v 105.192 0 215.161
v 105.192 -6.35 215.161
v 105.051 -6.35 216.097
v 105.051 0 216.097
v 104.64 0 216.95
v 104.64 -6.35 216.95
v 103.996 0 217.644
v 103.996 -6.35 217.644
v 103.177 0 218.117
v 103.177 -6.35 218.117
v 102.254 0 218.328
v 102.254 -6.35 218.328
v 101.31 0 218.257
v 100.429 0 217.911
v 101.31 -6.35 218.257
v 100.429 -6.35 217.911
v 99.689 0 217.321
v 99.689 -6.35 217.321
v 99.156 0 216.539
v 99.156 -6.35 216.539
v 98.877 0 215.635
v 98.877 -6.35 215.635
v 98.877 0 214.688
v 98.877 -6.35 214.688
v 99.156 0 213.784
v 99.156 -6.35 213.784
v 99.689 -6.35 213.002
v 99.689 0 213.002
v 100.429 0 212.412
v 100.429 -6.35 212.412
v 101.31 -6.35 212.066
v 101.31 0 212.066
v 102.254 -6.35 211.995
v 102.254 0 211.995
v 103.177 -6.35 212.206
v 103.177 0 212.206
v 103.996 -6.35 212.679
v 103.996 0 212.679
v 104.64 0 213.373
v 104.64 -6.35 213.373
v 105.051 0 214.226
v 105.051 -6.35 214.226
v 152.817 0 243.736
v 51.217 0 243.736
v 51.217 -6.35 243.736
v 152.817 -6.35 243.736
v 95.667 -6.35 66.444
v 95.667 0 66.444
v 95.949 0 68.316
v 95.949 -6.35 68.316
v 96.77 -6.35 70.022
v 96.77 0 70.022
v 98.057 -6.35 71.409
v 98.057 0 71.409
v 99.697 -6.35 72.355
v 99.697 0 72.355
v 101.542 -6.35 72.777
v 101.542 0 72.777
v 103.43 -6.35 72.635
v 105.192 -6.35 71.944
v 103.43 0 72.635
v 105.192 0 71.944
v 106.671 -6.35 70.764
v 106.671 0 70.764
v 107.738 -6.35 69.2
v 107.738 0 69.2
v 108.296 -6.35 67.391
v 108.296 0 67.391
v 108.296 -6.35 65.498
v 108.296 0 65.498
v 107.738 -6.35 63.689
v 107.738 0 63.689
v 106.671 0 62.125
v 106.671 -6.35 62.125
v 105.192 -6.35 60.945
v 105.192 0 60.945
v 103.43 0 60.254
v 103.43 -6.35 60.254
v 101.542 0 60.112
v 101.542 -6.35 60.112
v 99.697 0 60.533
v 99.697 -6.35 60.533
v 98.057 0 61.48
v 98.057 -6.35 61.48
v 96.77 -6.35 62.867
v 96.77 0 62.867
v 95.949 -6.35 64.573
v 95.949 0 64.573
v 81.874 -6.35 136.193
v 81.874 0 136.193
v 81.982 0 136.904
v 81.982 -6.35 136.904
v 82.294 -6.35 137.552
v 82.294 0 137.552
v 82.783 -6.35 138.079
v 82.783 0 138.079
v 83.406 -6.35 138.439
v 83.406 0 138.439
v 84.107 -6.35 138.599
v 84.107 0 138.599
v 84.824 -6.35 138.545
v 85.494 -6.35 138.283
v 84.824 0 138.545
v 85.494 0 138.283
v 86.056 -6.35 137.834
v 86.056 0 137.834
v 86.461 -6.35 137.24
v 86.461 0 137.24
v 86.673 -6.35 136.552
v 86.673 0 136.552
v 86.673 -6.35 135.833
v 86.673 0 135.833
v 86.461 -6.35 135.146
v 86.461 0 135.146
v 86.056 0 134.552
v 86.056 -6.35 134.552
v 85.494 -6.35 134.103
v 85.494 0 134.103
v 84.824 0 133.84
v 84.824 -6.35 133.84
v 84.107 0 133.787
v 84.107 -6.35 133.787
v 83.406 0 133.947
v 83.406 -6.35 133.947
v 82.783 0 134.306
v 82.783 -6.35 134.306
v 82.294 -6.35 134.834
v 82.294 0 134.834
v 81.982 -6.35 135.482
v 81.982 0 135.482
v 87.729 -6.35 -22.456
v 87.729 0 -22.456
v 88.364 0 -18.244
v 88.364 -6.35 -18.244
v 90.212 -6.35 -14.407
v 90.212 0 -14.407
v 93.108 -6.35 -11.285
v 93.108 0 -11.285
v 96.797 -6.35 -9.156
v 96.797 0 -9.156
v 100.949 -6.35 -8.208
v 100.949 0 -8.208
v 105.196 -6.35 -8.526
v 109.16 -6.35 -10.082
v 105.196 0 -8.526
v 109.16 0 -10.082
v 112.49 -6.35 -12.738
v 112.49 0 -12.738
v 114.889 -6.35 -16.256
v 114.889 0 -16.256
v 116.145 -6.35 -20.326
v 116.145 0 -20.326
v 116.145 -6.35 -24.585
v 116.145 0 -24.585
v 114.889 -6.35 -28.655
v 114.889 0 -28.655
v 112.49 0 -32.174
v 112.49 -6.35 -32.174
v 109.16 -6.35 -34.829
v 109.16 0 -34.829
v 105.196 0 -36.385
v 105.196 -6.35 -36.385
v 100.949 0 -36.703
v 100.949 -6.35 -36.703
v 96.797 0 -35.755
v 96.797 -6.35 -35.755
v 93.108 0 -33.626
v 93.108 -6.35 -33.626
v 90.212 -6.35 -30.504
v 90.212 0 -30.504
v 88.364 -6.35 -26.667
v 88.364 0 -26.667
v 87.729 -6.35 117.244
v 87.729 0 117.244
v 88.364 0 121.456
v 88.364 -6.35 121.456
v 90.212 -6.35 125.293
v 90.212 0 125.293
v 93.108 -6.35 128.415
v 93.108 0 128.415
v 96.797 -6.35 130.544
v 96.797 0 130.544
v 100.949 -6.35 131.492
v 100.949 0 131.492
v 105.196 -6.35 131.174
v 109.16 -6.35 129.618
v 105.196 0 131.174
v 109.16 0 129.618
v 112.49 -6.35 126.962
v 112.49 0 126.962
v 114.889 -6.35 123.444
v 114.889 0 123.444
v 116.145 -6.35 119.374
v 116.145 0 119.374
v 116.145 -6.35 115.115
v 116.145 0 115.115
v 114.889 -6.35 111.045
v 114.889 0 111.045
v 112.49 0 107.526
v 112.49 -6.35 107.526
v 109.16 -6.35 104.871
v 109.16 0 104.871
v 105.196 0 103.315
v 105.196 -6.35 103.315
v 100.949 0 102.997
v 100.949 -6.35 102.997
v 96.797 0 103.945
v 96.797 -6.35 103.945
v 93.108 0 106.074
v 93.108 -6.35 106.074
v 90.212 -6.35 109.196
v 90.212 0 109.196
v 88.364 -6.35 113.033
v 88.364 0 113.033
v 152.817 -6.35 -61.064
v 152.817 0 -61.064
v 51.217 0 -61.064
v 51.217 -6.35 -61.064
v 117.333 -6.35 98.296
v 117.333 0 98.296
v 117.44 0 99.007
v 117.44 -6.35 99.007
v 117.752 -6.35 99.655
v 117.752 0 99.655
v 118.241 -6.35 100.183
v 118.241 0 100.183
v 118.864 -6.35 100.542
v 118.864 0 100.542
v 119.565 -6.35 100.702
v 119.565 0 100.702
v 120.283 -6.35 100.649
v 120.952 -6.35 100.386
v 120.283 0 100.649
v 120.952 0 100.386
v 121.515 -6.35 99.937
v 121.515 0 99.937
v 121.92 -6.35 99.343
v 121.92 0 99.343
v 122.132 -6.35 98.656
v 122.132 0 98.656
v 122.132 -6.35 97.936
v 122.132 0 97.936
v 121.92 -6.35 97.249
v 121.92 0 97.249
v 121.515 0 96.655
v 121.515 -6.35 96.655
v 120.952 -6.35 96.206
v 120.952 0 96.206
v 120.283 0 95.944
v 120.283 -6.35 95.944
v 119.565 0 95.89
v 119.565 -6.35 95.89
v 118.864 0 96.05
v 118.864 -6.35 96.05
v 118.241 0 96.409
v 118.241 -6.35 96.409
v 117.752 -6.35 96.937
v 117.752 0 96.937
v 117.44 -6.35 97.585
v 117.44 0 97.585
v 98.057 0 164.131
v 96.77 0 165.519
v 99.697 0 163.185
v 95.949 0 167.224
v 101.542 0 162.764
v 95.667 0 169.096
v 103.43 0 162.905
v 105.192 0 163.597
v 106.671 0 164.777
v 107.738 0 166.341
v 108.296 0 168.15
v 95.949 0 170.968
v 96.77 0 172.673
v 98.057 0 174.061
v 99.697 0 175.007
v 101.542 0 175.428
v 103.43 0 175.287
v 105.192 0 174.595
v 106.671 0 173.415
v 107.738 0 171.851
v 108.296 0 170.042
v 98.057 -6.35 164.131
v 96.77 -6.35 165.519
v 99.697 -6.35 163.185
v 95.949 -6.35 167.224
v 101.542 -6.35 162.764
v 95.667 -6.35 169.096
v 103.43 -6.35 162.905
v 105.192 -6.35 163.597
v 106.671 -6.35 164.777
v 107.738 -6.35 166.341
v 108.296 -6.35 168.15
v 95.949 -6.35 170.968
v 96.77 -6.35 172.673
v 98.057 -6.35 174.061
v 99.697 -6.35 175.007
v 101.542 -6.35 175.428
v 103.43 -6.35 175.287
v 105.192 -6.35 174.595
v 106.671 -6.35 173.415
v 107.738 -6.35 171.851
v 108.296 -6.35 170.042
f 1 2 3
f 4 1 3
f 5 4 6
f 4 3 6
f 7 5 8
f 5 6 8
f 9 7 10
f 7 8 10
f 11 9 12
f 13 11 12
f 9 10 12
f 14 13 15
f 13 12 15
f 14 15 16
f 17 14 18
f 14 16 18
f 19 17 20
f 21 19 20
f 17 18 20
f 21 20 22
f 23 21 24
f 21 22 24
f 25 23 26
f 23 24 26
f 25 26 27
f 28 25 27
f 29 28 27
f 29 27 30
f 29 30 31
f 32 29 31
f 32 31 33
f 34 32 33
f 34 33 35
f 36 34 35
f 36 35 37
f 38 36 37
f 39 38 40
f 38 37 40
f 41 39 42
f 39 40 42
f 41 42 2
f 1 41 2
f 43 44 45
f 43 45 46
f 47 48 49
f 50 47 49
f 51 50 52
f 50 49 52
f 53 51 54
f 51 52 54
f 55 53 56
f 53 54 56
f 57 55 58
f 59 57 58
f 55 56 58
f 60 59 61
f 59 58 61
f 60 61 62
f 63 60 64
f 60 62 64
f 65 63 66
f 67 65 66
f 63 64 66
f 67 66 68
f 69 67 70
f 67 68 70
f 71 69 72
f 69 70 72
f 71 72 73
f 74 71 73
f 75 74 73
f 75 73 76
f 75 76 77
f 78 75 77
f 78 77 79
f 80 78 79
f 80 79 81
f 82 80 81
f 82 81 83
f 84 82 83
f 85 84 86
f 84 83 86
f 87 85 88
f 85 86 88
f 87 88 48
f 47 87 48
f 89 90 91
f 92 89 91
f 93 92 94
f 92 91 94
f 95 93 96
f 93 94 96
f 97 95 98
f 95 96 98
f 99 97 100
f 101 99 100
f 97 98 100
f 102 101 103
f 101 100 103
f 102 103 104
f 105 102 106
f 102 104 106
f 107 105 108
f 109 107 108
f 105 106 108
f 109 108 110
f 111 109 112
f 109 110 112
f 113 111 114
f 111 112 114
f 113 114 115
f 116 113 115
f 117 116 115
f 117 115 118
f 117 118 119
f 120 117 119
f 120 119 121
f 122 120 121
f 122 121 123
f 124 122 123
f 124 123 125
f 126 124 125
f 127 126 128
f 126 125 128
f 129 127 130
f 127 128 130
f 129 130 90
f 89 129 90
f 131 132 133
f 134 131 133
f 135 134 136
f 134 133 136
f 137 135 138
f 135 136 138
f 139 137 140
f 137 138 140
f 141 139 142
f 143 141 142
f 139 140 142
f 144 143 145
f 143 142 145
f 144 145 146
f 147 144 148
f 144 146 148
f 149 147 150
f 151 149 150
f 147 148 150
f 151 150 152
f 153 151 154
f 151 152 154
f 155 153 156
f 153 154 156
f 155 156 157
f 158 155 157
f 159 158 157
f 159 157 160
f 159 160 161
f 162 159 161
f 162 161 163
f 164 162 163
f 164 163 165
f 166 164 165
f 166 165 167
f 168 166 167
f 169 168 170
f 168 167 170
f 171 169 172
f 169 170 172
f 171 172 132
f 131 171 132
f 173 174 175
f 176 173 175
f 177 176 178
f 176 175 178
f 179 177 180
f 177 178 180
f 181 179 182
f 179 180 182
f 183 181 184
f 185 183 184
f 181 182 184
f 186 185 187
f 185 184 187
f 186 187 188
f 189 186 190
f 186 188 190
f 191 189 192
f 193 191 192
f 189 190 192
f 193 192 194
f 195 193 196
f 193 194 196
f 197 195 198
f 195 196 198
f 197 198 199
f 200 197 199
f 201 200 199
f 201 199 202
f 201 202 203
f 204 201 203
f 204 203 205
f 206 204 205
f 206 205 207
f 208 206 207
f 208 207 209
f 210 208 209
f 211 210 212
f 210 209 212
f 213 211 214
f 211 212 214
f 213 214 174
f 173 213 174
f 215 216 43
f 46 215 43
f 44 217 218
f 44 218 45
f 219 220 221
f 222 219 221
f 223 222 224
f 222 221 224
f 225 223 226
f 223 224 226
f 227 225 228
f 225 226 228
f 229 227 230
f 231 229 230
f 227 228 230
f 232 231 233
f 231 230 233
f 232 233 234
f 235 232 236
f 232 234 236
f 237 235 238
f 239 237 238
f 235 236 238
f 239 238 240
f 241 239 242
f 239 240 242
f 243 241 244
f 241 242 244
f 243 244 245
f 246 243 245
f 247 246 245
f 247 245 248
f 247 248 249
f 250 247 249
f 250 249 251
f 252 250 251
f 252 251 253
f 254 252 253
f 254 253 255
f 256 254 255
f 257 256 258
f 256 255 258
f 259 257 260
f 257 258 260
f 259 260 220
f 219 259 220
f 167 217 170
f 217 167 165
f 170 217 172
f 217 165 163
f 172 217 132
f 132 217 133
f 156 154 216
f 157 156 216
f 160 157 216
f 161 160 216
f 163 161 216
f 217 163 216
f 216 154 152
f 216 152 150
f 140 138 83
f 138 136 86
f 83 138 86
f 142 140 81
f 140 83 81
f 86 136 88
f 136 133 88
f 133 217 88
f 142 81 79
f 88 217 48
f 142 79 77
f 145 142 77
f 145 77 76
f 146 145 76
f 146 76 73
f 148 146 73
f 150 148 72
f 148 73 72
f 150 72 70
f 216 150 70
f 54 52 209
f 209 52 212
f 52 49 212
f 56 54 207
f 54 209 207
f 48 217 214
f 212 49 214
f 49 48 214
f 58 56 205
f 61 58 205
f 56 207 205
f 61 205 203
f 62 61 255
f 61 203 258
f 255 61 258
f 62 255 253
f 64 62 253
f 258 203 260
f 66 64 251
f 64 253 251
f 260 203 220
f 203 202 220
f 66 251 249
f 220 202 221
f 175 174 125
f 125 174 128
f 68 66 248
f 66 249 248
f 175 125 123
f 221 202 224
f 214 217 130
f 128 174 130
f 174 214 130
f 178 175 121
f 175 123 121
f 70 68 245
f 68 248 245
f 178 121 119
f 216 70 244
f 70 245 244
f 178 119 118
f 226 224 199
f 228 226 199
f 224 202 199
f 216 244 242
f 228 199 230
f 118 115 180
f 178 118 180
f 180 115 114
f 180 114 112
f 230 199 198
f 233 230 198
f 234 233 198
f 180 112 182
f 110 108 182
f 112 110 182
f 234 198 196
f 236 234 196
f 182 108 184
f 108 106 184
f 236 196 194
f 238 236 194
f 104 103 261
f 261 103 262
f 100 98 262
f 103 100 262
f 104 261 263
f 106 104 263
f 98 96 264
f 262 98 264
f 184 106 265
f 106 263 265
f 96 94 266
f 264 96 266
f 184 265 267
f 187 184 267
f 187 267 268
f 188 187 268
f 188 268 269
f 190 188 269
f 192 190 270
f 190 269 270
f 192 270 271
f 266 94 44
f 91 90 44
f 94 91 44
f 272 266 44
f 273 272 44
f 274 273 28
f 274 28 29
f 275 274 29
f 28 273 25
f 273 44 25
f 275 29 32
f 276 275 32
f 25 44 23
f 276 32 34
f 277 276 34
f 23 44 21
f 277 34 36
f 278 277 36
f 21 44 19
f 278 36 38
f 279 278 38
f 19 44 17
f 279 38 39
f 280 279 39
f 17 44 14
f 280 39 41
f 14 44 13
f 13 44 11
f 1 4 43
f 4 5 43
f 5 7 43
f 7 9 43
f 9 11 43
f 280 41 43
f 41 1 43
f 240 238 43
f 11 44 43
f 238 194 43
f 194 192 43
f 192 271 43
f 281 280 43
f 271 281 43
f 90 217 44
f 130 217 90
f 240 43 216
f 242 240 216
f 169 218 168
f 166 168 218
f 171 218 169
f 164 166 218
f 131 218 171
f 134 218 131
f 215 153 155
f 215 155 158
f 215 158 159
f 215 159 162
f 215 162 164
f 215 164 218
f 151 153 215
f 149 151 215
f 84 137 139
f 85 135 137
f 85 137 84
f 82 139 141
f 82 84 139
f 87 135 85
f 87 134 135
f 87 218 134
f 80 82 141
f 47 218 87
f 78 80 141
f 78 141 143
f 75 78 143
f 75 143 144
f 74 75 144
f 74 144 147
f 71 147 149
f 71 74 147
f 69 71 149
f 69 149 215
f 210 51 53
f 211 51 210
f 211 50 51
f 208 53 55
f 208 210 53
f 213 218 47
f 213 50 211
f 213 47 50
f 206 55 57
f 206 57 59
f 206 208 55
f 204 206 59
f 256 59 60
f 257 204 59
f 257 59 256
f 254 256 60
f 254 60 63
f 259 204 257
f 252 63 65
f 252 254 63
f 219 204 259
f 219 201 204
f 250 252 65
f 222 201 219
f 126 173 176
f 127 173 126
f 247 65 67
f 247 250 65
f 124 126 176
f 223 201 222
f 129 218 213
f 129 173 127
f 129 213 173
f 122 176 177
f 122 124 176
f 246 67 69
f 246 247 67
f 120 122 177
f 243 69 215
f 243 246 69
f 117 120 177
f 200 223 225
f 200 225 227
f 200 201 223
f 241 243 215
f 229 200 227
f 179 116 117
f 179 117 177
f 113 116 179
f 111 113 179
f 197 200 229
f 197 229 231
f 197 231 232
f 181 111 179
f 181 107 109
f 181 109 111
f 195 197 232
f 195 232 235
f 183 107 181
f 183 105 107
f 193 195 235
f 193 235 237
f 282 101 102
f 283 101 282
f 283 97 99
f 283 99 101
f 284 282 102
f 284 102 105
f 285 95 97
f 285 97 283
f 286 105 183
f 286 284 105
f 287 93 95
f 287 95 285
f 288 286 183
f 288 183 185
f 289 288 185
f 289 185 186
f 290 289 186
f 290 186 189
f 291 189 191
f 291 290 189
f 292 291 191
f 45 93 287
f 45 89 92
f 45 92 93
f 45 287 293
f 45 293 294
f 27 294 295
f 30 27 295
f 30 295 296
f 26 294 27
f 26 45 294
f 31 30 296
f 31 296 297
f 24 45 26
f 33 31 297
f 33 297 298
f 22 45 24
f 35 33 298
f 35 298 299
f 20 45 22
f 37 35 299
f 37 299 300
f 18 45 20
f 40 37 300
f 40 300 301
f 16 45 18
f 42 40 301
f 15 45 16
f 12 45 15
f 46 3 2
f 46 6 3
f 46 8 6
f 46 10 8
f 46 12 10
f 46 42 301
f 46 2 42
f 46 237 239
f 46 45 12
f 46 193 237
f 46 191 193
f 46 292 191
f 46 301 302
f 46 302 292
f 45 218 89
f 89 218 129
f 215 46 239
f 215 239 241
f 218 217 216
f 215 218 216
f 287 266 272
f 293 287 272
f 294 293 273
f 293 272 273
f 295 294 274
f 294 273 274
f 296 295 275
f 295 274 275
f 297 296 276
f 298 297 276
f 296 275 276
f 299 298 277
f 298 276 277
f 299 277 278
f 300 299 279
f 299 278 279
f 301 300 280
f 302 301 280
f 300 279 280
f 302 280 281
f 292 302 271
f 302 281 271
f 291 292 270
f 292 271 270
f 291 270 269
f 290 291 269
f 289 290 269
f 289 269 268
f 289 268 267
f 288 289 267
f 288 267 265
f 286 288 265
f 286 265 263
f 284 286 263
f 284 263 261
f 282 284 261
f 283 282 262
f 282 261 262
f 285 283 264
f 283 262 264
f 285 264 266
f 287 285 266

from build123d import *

# Parameters (mm, degrees)
F0_W      = 101.6
F0_H      = 304.8
F1_DEPTH  = 6.35
F2_R      = 3.175
F3_DEPTH  = 6.35
F4_R      = 14.2875
F5_DEPTH  = 6.35
F6_R      = 14.2875
F7_DEPTH  = 6.35
F8_R      = 2.413
F9_DEPTH  = 6.35
F10_R     = 6.35
F11_DEPTH = 6.35


with BuildPart() as f1:
    # F0 (on Front) → F1 (new body)
    with BuildSketch(Plane.XZ):
        with Locations((102.01661, 91.336442)):
            Rectangle(F0_W, F0_H)
    extrude(amount=F1_DEPTH)

    # F2 (on face) → F3 (cut)
    with BuildSketch(Plane.XZ.offset(6.35)):
        with Locations((102.01661, 215.161442)):
            Circle(F2_R)
    extrude(amount=-F3_DEPTH, mode=Mode.SUBTRACT)

    # F4 (on face) → F5 (cut)
    with BuildSketch(Plane(origin=(0, 0, 0), x_dir=(-1, 0, 0), z_dir=(0, 1, 0))):
        with Locations((-102.01661, -22.455558)):
            Circle(F4_R)
    extrude(amount=-F5_DEPTH, mode=Mode.SUBTRACT)

    # F6 (on face) → F7 (cut)
    with BuildSketch(Plane(origin=(0, 0, 0), x_dir=(-1, 0, 0), z_dir=(0, 1, 0))):
        with Locations((-102.01661, 117.244442)):
            Circle(F6_R)
    extrude(amount=-F7_DEPTH, mode=Mode.SUBTRACT)

    # F8 (on face) → F9 (cut)
    with BuildSketch(Plane(origin=(0, 0, 0), x_dir=(-1, 0, 0), z_dir=(0, 1, 0))):
        with Locations((-84.28741, 136.192842)):
            Circle(F8_R)
        with Locations((-119.74581, 98.296042)):
            Circle(F8_R)
    extrude(amount=-F9_DEPTH, mode=Mode.SUBTRACT)

    # F10 (on face) → F11 (cut)
    with BuildSketch(Plane(origin=(0, 0, 0), x_dir=(-1, 0, 0), z_dir=(0, 1, 0))):
        with Locations((-102.01661, 66.444442)):
            Circle(F10_R)
        with Locations((-102.01661, 169.095919)):
            Circle(F10_R)
    extrude(amount=-F11_DEPTH, mode=Mode.SUBTRACT)


solid = f1.part
